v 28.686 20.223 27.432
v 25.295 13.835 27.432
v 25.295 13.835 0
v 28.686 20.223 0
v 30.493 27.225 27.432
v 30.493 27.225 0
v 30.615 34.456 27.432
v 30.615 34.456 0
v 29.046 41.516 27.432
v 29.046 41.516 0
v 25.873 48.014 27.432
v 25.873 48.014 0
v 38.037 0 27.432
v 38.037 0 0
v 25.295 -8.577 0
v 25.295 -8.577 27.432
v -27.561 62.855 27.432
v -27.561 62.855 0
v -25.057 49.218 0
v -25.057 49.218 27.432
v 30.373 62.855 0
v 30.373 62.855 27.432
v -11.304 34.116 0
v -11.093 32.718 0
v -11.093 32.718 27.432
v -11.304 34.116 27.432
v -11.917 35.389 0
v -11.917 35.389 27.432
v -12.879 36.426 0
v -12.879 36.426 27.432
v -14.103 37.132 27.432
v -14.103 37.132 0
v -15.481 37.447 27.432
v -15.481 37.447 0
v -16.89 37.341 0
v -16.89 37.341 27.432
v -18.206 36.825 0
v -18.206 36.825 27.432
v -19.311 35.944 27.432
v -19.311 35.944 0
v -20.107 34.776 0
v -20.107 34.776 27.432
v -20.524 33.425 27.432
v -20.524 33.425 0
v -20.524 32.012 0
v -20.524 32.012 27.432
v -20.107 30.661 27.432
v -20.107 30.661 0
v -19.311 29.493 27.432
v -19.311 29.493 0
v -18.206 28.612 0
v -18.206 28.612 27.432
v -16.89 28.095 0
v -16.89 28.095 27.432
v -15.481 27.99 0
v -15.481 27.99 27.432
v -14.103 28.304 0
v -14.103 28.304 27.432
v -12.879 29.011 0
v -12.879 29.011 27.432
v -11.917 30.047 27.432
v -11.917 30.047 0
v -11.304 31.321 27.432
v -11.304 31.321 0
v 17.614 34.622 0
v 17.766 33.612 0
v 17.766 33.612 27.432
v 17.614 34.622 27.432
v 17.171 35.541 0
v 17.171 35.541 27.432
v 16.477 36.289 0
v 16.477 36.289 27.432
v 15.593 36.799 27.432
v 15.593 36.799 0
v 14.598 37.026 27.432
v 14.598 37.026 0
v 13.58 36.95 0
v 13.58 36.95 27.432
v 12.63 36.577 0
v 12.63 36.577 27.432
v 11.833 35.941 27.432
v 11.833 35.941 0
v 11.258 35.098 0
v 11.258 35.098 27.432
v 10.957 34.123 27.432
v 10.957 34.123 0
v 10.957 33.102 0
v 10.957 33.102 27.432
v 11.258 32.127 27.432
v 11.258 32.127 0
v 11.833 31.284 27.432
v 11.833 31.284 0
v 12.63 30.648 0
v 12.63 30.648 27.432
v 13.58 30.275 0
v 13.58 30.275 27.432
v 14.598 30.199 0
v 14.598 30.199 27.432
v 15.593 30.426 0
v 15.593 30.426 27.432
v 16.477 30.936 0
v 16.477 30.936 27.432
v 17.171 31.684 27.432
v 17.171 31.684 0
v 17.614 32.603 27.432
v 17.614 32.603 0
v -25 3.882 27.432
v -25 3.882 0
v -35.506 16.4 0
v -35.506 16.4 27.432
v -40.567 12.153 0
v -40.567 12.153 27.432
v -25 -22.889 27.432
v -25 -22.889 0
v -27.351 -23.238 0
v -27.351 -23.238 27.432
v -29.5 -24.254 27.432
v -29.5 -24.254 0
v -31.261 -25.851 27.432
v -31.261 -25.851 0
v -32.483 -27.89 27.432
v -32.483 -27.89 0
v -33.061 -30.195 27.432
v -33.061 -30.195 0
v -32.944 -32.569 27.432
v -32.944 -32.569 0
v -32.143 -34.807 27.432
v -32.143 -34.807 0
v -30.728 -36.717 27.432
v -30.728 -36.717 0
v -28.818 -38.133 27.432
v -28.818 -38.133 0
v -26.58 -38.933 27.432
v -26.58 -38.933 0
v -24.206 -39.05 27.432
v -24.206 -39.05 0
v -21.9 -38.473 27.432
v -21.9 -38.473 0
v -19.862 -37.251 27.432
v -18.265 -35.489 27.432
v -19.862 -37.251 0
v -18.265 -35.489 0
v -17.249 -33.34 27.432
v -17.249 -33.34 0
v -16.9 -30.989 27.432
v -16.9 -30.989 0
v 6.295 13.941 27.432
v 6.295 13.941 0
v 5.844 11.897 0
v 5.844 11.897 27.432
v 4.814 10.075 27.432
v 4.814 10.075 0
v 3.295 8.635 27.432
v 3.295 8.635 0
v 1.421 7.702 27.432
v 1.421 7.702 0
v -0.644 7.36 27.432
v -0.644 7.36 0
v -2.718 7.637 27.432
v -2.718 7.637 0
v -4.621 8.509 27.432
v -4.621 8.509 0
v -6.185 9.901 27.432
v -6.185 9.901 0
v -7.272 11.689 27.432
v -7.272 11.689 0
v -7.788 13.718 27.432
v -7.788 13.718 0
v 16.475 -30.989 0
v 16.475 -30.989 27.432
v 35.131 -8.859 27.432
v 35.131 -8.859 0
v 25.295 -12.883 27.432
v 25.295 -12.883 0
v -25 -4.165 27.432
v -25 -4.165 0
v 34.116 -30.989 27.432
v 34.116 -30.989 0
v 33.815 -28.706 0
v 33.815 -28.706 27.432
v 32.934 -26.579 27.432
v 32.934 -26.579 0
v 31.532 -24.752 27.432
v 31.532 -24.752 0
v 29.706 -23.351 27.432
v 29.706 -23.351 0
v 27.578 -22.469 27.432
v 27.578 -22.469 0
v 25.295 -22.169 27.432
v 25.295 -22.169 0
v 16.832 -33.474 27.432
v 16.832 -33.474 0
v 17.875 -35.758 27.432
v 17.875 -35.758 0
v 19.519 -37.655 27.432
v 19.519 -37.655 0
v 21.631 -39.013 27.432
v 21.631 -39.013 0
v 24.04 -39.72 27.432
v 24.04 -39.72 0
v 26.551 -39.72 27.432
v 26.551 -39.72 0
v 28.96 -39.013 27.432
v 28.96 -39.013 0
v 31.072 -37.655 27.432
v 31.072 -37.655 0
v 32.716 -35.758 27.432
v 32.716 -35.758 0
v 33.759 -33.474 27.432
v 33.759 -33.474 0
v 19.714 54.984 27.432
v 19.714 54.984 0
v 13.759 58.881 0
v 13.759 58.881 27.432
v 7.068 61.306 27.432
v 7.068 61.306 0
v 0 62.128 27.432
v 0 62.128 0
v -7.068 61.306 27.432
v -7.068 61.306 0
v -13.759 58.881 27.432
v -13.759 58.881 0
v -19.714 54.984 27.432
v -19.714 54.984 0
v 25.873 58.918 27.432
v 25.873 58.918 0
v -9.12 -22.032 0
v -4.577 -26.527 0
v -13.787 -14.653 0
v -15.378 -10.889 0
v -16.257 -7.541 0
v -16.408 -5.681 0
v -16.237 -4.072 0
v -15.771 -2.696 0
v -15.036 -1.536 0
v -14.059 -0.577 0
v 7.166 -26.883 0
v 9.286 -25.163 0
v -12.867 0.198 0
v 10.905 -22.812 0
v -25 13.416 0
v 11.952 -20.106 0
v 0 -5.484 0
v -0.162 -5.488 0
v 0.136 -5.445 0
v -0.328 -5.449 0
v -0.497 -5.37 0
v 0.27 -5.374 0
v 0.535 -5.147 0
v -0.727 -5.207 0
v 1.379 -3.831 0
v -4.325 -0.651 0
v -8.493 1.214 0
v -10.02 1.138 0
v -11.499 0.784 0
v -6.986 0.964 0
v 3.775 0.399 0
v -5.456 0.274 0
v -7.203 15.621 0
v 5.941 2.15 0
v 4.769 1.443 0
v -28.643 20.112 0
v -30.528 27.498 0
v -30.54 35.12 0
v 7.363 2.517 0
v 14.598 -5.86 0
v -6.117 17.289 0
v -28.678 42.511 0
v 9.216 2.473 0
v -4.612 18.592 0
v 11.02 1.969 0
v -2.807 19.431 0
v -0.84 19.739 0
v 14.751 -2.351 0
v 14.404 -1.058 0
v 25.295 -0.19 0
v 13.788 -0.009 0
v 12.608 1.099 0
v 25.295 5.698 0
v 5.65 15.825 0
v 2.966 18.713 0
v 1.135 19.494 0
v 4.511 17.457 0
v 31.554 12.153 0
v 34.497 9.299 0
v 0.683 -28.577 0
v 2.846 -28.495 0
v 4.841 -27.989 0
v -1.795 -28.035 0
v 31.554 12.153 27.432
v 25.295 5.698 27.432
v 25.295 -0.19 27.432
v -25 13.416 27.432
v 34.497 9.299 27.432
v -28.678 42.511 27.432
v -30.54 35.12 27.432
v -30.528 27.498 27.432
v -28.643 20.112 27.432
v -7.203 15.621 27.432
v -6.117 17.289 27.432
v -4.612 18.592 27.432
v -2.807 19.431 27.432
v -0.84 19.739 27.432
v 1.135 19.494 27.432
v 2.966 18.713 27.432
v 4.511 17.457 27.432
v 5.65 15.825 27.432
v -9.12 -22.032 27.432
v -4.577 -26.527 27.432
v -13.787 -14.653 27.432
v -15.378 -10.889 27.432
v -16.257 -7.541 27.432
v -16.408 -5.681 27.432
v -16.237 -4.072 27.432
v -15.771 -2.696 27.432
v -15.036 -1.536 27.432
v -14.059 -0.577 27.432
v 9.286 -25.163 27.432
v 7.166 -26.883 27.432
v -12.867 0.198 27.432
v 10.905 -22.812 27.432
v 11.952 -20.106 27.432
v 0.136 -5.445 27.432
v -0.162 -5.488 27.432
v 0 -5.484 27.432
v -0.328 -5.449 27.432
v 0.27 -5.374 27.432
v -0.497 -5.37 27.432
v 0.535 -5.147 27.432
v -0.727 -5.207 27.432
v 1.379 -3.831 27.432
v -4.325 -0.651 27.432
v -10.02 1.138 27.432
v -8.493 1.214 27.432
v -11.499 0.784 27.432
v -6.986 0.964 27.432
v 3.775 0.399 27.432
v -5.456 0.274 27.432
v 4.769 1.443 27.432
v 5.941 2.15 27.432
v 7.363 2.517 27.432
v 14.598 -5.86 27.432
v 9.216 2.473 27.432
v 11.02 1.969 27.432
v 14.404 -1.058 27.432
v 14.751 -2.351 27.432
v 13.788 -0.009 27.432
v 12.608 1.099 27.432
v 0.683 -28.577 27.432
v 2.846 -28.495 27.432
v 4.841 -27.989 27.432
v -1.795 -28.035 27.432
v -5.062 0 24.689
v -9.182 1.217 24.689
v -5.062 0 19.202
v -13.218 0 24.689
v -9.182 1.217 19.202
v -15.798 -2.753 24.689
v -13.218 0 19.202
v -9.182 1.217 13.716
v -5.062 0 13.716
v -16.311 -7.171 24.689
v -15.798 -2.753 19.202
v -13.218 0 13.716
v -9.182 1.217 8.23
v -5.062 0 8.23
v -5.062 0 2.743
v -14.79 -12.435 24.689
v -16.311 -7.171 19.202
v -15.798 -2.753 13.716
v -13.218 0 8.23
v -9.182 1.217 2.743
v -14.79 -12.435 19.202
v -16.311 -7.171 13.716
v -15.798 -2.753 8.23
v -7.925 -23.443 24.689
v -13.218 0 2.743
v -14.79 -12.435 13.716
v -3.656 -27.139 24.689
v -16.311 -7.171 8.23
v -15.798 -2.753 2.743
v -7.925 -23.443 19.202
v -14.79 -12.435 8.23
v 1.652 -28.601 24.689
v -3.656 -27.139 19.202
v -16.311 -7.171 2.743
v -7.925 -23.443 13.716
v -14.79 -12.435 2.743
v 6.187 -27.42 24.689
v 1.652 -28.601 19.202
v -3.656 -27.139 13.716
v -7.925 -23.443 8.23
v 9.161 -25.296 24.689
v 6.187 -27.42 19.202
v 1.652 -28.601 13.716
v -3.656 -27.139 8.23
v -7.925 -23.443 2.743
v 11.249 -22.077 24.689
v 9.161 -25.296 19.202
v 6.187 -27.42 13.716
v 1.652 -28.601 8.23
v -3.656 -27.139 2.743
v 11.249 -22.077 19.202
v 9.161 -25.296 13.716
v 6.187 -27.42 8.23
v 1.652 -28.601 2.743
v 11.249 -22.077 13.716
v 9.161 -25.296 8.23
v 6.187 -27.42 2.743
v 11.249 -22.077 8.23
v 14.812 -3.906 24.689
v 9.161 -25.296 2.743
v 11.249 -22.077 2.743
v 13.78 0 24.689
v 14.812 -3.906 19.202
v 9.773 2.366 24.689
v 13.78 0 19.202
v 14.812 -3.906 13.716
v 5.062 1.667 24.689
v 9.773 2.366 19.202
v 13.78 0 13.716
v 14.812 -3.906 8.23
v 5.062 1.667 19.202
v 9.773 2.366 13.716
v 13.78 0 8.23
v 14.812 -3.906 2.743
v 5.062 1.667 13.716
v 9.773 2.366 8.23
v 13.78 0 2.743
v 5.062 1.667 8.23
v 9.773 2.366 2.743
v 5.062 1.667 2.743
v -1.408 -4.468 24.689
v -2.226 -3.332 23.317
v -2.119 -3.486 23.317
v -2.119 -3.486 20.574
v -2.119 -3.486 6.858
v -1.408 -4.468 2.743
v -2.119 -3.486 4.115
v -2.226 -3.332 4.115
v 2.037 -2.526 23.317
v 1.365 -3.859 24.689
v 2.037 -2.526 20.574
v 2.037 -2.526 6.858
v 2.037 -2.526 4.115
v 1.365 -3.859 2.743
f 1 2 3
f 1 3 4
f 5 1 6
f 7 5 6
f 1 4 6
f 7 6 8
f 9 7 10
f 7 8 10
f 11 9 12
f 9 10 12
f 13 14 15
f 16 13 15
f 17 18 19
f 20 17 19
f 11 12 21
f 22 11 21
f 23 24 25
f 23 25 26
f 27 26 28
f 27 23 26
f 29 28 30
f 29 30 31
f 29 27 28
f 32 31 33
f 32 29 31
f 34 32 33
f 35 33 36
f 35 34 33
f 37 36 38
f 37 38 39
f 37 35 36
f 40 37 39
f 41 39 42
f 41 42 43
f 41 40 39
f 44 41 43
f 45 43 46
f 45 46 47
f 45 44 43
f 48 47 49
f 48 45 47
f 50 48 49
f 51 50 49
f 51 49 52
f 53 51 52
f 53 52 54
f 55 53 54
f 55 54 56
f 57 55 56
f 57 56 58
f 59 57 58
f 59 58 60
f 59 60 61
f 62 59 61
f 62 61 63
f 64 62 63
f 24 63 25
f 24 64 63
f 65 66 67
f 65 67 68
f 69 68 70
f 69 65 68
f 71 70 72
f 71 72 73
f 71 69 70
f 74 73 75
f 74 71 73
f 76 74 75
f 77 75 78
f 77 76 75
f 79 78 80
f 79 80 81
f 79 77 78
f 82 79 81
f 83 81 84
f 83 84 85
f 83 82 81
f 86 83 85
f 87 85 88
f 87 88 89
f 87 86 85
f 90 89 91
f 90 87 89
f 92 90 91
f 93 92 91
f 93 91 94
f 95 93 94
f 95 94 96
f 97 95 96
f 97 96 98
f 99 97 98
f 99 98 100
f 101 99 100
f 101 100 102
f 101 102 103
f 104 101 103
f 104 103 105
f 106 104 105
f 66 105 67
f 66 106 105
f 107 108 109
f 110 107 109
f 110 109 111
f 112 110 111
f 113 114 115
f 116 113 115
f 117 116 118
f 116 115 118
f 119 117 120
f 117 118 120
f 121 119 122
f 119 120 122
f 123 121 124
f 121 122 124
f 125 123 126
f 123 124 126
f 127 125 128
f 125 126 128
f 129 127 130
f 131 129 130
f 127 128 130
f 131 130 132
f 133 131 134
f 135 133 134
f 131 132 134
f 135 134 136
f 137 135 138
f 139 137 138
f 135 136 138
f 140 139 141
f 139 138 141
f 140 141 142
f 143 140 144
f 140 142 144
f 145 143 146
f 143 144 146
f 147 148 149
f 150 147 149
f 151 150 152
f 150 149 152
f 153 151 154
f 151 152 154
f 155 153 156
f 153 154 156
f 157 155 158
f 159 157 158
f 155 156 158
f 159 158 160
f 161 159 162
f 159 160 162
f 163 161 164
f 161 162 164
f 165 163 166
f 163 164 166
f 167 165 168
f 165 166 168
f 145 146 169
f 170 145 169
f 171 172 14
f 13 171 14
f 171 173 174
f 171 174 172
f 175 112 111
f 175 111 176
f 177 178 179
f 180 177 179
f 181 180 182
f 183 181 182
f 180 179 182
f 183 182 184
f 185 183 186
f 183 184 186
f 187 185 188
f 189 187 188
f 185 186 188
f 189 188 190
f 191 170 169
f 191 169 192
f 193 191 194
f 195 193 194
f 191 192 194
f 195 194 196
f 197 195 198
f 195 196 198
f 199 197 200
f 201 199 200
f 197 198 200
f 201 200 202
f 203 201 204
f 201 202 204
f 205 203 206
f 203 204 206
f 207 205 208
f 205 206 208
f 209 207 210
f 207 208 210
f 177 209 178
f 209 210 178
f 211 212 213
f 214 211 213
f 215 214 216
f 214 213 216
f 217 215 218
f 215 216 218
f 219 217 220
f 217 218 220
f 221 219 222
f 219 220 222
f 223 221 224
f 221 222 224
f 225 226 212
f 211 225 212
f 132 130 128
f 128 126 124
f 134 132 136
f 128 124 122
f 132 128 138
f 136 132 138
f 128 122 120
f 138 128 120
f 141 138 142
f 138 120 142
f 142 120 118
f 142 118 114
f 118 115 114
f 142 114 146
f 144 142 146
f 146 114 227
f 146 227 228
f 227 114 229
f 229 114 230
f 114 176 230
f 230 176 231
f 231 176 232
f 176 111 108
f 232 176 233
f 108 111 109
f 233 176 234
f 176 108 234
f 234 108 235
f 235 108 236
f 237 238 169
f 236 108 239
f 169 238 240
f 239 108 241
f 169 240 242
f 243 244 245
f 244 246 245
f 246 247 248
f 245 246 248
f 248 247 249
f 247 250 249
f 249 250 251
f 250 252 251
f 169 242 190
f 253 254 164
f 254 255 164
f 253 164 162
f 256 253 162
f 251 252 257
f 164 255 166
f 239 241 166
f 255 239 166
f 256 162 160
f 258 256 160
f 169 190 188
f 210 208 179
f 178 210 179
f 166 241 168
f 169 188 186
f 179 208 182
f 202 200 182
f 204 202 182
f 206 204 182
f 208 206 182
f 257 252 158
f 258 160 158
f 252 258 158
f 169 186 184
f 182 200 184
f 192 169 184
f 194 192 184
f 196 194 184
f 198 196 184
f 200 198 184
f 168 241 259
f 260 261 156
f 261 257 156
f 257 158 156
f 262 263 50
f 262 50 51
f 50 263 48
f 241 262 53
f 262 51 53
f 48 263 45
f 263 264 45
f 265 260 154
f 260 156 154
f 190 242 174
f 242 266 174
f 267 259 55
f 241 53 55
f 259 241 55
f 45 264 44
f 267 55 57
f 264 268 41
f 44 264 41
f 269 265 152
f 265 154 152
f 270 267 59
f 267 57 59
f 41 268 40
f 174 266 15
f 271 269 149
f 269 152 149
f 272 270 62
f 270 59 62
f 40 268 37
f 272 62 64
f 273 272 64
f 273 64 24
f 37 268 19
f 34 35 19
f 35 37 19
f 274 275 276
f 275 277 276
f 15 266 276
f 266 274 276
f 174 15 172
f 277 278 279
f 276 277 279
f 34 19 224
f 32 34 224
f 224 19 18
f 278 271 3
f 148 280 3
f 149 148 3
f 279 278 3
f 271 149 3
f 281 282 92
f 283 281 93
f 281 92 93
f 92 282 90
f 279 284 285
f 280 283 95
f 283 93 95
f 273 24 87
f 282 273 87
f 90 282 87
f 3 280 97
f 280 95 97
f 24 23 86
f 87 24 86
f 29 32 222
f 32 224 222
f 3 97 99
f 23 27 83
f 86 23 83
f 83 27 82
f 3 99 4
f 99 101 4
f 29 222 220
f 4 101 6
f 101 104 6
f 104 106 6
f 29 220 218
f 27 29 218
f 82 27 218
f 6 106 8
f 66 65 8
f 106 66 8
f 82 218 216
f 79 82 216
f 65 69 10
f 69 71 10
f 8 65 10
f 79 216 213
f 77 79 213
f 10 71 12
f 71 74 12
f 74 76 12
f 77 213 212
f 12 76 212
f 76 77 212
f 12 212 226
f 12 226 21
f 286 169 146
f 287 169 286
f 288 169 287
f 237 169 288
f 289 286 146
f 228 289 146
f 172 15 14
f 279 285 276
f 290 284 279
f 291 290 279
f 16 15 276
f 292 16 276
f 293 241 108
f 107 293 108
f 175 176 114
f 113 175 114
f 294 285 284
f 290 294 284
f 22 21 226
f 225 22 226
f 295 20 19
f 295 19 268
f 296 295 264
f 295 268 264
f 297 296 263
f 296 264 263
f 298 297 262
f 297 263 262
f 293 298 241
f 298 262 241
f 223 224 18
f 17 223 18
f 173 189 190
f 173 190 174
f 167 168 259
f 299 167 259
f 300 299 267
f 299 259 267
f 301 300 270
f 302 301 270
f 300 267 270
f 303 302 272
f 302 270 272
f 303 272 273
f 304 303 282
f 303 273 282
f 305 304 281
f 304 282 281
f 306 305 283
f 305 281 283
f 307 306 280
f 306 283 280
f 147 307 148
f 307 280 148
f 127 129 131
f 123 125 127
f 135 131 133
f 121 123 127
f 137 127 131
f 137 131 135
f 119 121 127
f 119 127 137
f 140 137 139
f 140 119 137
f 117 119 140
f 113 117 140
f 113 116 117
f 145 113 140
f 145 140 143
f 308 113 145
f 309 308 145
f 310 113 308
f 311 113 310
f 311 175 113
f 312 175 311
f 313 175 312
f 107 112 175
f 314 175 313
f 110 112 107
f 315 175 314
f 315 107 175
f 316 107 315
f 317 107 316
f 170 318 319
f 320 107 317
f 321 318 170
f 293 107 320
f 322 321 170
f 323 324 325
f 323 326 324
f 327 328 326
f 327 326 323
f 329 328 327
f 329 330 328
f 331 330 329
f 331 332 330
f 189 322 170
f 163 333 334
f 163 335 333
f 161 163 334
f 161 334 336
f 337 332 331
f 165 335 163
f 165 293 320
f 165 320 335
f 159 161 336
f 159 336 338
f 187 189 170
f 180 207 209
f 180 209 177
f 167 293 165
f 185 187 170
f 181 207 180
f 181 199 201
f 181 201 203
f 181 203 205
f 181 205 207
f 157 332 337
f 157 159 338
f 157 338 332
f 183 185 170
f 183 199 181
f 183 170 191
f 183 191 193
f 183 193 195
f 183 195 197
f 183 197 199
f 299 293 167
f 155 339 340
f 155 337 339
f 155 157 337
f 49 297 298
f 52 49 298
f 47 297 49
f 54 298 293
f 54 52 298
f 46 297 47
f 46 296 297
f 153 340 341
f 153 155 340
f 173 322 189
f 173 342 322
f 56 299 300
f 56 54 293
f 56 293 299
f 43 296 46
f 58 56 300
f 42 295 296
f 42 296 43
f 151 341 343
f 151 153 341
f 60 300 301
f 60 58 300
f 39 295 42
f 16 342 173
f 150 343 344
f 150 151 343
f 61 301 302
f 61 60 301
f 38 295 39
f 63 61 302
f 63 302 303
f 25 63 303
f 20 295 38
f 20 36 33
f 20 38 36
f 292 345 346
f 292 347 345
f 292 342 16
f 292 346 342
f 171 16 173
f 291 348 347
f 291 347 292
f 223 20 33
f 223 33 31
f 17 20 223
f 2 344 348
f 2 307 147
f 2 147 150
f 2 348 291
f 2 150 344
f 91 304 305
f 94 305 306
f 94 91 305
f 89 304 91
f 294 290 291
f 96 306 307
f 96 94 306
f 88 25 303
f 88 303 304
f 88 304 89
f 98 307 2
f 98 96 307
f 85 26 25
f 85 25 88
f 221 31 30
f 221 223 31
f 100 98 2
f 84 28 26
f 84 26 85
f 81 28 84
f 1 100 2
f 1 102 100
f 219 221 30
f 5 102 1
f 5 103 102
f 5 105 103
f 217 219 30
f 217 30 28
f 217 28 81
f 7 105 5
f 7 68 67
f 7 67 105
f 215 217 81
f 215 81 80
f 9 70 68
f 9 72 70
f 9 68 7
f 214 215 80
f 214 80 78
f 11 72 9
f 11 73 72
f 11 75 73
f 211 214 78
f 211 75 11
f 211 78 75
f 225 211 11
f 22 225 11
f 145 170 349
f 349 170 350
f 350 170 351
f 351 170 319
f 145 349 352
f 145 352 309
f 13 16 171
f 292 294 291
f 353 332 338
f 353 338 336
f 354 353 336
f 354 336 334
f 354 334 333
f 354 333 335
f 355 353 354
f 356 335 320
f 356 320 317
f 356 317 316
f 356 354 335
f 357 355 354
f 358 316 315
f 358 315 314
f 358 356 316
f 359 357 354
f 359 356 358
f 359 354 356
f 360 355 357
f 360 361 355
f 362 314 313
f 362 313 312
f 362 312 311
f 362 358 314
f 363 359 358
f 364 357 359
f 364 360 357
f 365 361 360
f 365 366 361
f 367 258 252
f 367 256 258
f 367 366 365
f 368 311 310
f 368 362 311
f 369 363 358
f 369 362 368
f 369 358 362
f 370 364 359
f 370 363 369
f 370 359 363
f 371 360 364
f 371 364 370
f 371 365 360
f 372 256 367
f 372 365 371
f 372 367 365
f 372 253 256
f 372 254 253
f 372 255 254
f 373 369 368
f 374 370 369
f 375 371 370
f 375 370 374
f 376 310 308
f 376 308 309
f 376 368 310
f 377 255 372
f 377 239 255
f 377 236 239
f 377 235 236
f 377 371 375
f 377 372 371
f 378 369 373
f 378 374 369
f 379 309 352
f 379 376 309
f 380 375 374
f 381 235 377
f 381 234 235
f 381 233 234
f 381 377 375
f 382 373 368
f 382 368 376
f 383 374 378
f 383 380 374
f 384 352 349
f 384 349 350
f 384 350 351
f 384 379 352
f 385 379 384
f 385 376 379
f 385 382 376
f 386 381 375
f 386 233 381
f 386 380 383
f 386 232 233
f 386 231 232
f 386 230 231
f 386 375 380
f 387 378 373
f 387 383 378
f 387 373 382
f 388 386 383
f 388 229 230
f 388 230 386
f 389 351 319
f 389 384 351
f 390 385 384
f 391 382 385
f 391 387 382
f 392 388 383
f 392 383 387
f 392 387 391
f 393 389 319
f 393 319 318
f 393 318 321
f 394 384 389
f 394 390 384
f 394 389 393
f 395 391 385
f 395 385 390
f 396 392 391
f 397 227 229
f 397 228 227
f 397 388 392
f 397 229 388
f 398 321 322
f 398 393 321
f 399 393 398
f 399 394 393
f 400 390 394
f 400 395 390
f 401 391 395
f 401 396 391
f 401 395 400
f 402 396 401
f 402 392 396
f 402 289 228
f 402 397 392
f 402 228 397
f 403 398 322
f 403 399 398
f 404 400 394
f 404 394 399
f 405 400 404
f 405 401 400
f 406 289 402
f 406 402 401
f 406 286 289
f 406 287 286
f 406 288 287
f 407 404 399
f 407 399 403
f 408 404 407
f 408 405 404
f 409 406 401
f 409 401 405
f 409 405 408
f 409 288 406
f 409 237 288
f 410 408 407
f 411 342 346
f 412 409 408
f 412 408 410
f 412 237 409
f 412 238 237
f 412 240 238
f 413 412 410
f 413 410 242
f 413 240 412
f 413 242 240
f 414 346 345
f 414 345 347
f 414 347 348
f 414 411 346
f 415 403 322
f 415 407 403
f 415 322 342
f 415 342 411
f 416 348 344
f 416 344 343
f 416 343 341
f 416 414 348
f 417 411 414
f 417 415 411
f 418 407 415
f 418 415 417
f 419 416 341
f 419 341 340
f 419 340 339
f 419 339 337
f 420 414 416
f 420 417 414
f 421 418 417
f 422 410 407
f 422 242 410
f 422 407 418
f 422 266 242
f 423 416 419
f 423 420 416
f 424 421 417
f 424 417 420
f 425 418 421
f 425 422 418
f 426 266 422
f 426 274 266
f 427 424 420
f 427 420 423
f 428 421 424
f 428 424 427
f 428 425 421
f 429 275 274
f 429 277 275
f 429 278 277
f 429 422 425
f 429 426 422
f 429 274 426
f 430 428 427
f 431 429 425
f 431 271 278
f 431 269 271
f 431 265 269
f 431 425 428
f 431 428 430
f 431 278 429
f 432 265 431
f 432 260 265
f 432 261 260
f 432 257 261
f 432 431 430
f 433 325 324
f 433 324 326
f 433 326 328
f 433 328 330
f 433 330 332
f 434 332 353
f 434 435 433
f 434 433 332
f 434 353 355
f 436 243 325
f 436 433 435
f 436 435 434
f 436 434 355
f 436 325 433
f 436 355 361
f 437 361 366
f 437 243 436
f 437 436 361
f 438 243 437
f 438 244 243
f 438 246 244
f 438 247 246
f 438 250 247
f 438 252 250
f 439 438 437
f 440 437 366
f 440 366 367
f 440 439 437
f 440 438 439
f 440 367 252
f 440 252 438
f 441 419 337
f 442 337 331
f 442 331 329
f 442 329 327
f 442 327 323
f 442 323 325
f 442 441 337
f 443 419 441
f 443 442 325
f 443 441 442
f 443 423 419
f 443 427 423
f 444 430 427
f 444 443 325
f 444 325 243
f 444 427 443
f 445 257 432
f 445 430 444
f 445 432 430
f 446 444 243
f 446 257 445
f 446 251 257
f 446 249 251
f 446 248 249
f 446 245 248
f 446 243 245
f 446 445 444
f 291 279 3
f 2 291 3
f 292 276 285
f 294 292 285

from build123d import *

# Parameters (mm, degrees)
F0_R     = 4.7418950376
F0_R_2   = 3.4234930155
F1_DEPTH = 27.432


# Not quite as in the source:
# - a feature names something its author has since deleted; it is built from what else it names


with BuildPart() as f1:
    # F0 (on Top) → F1 (new body)
    with BuildSketch(Plane.XY):
        with BuildLine():
            Line((25.2953674644, 5.6984800103), (25.2953674644, 13.8353250349))
            ThreePointArc((25.2953674644, 13.8353250349), (30.7668689842, 30.8370384198), (25.8731804788, 48.0139822607))
            Line((25.8731804788, 48.0139822607), (30.3728617728, 62.8549531102))
            Line((30.3728617728, 62.8549531102), (25.8731804788, 58.917734772))
            Line((25.8731804788, 58.917734772), (19.7135022724, 54.9844578476))
            ThreePointArc((19.7135022724, 54.9844578476), (0, 62.1284381568), (-19.7135022724, 54.9844578476))
            Line((-19.7135022724, 54.9844578476), (-27.5605618954, 62.8549531102))
            Line((-27.5605618954, 62.8549531102), (-25.0568710899, 49.2184152222))
            ThreePointArc((-25.0568710899, 49.2184152222), (-30.7712265115, 31.3083269796), (-25.0000394881, 13.4164707571))
            Line((-25.0000394881, 13.4164707571), (-25.0000394881, 10.5883115903))
            Line((-25.0000394881, 10.5883115903), (-25.0000394881, 3.8822568022))
            Line((-25.0000394881, 3.8822568022), (-35.5061925948, 16.4002254605))
            Line((-35.5061925948, 16.4002254605), (-40.5666477737, 12.1530573815))
            Line((-40.5666477737, 12.1530573815), (-25.0000394881, -4.1650086641))
            Line((-25.0000394881, -4.1650086641), (-25.0000394881, -22.8893524268))
            ThreePointArc((-25.0000394881, -22.8893524268), (-19.2725639904, -25.2617504561), (-16.9001659611, -30.9892259538))
            Line((-16.9001659611, -30.9892259538), (16.4749322786, -30.9892259538))
            ThreePointArc((16.4749322786, -30.9892259538), (19.0583779315, -24.7522364209), (25.2953674644, -22.168790768))
            Line((25.2953674644, -22.168790768), (25.2953674644, -12.8828799352))
            Line((25.2953674644, -12.8828799352), (35.1309105754, -8.8592460379))
            Line((35.1309105754, -8.8592460379), (38.0368679762, 0))
            Line((38.0368679762, 0), (25.2953674644, -8.5769504594))
            Line((25.2953674644, -8.5769504594), (25.2953674644, -0.1902780768))
            Line((25.2953674644, -0.1902780768), (34.4973343106, 9.2992545014))
            Line((34.4973343106, 9.2992545014), (31.5543487668, 12.1530573815))
            Line((31.5543487668, 12.1530573815), (25.2953674644, 5.6984800103))
        make_face()
        with BuildLine():
            add(Edge.make_bspline(
                [(0, -5.4839896038), (-1.2402732611, -5.6900448164), (-4.274773093, 2.3105176673), (-14.1907812378, 0.9256060054), (-19.0134260803, -7.4792396235), (-5.4071900703, -30.3441353211), (6.5664135103, -28.1751540776), (12.3781283881, -22.4582417314), (13.6895995956, -9.0366780223), (16.3381064135, 0.8586419268), (3.4670177632, 4.8861409136), (1.3437918836, -5.2607361233), (0, -5.4839896038)],
                knots=[0, 0, 0, 0, 0.0862123206, 0.176335532, 0.2645289981, 0.4179663282, 0.5169948409, 0.6026118794, 0.7186193313, 0.8125731341, 0.9065920226, 1, 1, 1, 1], degree=3))
        make_face(mode=Mode.SUBTRACT)
        with Locations((-15.8350989223, 32.7182896435)):
            Circle(F0_R, mode=Mode.SUBTRACT)
        with BuildLine():
            ThreePointArc((6.2948795967, 13.9413382858), (-0.643780333, 7.3596103039), (-7.7878357843, 13.7178031728))
            ThreePointArc((-7.7878357843, 13.7178031728), (-0.8402846529, 19.7393853242), (6.2948795967, 13.9413382858))
        make_face(mode=Mode.SUBTRACT)
        with Locations((14.3421432003, 33.6124300957)):
            Circle(F0_R_2, mode=Mode.SUBTRACT)
        with BuildLine():
            ThreePointArc((34.1158026503, -30.9892259538), (31.5323569973, -24.7522364209), (25.2953674644, -22.168790768))
            Line((25.2953674644, -22.168790768), (25.2953674644, -30.9892259538))
            Line((25.2953674644, -30.9892259538), (16.4749322786, -30.9892259538))
            ThreePointArc((16.4749322786, -30.9892259538), (25.2953674644, -39.8096611397), (34.1158026503, -30.9892259538))
        make_face()
        with BuildLine():
            Line((25.2953674644, -30.9892259538), (25.2953674644, -22.168790768))
            ThreePointArc((25.2953674644, -22.168790768), (19.0583779315, -24.7522364209), (16.4749322786, -30.9892259538))
            Line((16.4749322786, -30.9892259538), (25.2953674644, -30.9892259538))
        make_face()
        with BuildLine():
            ThreePointArc((-25.0000394881, -22.8893524268), (-30.7275149858, -36.7167014515), (-16.9001659611, -30.9892259538))
            ThreePointArc((-16.9001659611, -30.9892259538), (-19.2725639904, -25.2617504561), (-25.0000394881, -22.8893524268))
        make_face()
    extrude(amount=F1_DEPTH)


solid = f1.part
